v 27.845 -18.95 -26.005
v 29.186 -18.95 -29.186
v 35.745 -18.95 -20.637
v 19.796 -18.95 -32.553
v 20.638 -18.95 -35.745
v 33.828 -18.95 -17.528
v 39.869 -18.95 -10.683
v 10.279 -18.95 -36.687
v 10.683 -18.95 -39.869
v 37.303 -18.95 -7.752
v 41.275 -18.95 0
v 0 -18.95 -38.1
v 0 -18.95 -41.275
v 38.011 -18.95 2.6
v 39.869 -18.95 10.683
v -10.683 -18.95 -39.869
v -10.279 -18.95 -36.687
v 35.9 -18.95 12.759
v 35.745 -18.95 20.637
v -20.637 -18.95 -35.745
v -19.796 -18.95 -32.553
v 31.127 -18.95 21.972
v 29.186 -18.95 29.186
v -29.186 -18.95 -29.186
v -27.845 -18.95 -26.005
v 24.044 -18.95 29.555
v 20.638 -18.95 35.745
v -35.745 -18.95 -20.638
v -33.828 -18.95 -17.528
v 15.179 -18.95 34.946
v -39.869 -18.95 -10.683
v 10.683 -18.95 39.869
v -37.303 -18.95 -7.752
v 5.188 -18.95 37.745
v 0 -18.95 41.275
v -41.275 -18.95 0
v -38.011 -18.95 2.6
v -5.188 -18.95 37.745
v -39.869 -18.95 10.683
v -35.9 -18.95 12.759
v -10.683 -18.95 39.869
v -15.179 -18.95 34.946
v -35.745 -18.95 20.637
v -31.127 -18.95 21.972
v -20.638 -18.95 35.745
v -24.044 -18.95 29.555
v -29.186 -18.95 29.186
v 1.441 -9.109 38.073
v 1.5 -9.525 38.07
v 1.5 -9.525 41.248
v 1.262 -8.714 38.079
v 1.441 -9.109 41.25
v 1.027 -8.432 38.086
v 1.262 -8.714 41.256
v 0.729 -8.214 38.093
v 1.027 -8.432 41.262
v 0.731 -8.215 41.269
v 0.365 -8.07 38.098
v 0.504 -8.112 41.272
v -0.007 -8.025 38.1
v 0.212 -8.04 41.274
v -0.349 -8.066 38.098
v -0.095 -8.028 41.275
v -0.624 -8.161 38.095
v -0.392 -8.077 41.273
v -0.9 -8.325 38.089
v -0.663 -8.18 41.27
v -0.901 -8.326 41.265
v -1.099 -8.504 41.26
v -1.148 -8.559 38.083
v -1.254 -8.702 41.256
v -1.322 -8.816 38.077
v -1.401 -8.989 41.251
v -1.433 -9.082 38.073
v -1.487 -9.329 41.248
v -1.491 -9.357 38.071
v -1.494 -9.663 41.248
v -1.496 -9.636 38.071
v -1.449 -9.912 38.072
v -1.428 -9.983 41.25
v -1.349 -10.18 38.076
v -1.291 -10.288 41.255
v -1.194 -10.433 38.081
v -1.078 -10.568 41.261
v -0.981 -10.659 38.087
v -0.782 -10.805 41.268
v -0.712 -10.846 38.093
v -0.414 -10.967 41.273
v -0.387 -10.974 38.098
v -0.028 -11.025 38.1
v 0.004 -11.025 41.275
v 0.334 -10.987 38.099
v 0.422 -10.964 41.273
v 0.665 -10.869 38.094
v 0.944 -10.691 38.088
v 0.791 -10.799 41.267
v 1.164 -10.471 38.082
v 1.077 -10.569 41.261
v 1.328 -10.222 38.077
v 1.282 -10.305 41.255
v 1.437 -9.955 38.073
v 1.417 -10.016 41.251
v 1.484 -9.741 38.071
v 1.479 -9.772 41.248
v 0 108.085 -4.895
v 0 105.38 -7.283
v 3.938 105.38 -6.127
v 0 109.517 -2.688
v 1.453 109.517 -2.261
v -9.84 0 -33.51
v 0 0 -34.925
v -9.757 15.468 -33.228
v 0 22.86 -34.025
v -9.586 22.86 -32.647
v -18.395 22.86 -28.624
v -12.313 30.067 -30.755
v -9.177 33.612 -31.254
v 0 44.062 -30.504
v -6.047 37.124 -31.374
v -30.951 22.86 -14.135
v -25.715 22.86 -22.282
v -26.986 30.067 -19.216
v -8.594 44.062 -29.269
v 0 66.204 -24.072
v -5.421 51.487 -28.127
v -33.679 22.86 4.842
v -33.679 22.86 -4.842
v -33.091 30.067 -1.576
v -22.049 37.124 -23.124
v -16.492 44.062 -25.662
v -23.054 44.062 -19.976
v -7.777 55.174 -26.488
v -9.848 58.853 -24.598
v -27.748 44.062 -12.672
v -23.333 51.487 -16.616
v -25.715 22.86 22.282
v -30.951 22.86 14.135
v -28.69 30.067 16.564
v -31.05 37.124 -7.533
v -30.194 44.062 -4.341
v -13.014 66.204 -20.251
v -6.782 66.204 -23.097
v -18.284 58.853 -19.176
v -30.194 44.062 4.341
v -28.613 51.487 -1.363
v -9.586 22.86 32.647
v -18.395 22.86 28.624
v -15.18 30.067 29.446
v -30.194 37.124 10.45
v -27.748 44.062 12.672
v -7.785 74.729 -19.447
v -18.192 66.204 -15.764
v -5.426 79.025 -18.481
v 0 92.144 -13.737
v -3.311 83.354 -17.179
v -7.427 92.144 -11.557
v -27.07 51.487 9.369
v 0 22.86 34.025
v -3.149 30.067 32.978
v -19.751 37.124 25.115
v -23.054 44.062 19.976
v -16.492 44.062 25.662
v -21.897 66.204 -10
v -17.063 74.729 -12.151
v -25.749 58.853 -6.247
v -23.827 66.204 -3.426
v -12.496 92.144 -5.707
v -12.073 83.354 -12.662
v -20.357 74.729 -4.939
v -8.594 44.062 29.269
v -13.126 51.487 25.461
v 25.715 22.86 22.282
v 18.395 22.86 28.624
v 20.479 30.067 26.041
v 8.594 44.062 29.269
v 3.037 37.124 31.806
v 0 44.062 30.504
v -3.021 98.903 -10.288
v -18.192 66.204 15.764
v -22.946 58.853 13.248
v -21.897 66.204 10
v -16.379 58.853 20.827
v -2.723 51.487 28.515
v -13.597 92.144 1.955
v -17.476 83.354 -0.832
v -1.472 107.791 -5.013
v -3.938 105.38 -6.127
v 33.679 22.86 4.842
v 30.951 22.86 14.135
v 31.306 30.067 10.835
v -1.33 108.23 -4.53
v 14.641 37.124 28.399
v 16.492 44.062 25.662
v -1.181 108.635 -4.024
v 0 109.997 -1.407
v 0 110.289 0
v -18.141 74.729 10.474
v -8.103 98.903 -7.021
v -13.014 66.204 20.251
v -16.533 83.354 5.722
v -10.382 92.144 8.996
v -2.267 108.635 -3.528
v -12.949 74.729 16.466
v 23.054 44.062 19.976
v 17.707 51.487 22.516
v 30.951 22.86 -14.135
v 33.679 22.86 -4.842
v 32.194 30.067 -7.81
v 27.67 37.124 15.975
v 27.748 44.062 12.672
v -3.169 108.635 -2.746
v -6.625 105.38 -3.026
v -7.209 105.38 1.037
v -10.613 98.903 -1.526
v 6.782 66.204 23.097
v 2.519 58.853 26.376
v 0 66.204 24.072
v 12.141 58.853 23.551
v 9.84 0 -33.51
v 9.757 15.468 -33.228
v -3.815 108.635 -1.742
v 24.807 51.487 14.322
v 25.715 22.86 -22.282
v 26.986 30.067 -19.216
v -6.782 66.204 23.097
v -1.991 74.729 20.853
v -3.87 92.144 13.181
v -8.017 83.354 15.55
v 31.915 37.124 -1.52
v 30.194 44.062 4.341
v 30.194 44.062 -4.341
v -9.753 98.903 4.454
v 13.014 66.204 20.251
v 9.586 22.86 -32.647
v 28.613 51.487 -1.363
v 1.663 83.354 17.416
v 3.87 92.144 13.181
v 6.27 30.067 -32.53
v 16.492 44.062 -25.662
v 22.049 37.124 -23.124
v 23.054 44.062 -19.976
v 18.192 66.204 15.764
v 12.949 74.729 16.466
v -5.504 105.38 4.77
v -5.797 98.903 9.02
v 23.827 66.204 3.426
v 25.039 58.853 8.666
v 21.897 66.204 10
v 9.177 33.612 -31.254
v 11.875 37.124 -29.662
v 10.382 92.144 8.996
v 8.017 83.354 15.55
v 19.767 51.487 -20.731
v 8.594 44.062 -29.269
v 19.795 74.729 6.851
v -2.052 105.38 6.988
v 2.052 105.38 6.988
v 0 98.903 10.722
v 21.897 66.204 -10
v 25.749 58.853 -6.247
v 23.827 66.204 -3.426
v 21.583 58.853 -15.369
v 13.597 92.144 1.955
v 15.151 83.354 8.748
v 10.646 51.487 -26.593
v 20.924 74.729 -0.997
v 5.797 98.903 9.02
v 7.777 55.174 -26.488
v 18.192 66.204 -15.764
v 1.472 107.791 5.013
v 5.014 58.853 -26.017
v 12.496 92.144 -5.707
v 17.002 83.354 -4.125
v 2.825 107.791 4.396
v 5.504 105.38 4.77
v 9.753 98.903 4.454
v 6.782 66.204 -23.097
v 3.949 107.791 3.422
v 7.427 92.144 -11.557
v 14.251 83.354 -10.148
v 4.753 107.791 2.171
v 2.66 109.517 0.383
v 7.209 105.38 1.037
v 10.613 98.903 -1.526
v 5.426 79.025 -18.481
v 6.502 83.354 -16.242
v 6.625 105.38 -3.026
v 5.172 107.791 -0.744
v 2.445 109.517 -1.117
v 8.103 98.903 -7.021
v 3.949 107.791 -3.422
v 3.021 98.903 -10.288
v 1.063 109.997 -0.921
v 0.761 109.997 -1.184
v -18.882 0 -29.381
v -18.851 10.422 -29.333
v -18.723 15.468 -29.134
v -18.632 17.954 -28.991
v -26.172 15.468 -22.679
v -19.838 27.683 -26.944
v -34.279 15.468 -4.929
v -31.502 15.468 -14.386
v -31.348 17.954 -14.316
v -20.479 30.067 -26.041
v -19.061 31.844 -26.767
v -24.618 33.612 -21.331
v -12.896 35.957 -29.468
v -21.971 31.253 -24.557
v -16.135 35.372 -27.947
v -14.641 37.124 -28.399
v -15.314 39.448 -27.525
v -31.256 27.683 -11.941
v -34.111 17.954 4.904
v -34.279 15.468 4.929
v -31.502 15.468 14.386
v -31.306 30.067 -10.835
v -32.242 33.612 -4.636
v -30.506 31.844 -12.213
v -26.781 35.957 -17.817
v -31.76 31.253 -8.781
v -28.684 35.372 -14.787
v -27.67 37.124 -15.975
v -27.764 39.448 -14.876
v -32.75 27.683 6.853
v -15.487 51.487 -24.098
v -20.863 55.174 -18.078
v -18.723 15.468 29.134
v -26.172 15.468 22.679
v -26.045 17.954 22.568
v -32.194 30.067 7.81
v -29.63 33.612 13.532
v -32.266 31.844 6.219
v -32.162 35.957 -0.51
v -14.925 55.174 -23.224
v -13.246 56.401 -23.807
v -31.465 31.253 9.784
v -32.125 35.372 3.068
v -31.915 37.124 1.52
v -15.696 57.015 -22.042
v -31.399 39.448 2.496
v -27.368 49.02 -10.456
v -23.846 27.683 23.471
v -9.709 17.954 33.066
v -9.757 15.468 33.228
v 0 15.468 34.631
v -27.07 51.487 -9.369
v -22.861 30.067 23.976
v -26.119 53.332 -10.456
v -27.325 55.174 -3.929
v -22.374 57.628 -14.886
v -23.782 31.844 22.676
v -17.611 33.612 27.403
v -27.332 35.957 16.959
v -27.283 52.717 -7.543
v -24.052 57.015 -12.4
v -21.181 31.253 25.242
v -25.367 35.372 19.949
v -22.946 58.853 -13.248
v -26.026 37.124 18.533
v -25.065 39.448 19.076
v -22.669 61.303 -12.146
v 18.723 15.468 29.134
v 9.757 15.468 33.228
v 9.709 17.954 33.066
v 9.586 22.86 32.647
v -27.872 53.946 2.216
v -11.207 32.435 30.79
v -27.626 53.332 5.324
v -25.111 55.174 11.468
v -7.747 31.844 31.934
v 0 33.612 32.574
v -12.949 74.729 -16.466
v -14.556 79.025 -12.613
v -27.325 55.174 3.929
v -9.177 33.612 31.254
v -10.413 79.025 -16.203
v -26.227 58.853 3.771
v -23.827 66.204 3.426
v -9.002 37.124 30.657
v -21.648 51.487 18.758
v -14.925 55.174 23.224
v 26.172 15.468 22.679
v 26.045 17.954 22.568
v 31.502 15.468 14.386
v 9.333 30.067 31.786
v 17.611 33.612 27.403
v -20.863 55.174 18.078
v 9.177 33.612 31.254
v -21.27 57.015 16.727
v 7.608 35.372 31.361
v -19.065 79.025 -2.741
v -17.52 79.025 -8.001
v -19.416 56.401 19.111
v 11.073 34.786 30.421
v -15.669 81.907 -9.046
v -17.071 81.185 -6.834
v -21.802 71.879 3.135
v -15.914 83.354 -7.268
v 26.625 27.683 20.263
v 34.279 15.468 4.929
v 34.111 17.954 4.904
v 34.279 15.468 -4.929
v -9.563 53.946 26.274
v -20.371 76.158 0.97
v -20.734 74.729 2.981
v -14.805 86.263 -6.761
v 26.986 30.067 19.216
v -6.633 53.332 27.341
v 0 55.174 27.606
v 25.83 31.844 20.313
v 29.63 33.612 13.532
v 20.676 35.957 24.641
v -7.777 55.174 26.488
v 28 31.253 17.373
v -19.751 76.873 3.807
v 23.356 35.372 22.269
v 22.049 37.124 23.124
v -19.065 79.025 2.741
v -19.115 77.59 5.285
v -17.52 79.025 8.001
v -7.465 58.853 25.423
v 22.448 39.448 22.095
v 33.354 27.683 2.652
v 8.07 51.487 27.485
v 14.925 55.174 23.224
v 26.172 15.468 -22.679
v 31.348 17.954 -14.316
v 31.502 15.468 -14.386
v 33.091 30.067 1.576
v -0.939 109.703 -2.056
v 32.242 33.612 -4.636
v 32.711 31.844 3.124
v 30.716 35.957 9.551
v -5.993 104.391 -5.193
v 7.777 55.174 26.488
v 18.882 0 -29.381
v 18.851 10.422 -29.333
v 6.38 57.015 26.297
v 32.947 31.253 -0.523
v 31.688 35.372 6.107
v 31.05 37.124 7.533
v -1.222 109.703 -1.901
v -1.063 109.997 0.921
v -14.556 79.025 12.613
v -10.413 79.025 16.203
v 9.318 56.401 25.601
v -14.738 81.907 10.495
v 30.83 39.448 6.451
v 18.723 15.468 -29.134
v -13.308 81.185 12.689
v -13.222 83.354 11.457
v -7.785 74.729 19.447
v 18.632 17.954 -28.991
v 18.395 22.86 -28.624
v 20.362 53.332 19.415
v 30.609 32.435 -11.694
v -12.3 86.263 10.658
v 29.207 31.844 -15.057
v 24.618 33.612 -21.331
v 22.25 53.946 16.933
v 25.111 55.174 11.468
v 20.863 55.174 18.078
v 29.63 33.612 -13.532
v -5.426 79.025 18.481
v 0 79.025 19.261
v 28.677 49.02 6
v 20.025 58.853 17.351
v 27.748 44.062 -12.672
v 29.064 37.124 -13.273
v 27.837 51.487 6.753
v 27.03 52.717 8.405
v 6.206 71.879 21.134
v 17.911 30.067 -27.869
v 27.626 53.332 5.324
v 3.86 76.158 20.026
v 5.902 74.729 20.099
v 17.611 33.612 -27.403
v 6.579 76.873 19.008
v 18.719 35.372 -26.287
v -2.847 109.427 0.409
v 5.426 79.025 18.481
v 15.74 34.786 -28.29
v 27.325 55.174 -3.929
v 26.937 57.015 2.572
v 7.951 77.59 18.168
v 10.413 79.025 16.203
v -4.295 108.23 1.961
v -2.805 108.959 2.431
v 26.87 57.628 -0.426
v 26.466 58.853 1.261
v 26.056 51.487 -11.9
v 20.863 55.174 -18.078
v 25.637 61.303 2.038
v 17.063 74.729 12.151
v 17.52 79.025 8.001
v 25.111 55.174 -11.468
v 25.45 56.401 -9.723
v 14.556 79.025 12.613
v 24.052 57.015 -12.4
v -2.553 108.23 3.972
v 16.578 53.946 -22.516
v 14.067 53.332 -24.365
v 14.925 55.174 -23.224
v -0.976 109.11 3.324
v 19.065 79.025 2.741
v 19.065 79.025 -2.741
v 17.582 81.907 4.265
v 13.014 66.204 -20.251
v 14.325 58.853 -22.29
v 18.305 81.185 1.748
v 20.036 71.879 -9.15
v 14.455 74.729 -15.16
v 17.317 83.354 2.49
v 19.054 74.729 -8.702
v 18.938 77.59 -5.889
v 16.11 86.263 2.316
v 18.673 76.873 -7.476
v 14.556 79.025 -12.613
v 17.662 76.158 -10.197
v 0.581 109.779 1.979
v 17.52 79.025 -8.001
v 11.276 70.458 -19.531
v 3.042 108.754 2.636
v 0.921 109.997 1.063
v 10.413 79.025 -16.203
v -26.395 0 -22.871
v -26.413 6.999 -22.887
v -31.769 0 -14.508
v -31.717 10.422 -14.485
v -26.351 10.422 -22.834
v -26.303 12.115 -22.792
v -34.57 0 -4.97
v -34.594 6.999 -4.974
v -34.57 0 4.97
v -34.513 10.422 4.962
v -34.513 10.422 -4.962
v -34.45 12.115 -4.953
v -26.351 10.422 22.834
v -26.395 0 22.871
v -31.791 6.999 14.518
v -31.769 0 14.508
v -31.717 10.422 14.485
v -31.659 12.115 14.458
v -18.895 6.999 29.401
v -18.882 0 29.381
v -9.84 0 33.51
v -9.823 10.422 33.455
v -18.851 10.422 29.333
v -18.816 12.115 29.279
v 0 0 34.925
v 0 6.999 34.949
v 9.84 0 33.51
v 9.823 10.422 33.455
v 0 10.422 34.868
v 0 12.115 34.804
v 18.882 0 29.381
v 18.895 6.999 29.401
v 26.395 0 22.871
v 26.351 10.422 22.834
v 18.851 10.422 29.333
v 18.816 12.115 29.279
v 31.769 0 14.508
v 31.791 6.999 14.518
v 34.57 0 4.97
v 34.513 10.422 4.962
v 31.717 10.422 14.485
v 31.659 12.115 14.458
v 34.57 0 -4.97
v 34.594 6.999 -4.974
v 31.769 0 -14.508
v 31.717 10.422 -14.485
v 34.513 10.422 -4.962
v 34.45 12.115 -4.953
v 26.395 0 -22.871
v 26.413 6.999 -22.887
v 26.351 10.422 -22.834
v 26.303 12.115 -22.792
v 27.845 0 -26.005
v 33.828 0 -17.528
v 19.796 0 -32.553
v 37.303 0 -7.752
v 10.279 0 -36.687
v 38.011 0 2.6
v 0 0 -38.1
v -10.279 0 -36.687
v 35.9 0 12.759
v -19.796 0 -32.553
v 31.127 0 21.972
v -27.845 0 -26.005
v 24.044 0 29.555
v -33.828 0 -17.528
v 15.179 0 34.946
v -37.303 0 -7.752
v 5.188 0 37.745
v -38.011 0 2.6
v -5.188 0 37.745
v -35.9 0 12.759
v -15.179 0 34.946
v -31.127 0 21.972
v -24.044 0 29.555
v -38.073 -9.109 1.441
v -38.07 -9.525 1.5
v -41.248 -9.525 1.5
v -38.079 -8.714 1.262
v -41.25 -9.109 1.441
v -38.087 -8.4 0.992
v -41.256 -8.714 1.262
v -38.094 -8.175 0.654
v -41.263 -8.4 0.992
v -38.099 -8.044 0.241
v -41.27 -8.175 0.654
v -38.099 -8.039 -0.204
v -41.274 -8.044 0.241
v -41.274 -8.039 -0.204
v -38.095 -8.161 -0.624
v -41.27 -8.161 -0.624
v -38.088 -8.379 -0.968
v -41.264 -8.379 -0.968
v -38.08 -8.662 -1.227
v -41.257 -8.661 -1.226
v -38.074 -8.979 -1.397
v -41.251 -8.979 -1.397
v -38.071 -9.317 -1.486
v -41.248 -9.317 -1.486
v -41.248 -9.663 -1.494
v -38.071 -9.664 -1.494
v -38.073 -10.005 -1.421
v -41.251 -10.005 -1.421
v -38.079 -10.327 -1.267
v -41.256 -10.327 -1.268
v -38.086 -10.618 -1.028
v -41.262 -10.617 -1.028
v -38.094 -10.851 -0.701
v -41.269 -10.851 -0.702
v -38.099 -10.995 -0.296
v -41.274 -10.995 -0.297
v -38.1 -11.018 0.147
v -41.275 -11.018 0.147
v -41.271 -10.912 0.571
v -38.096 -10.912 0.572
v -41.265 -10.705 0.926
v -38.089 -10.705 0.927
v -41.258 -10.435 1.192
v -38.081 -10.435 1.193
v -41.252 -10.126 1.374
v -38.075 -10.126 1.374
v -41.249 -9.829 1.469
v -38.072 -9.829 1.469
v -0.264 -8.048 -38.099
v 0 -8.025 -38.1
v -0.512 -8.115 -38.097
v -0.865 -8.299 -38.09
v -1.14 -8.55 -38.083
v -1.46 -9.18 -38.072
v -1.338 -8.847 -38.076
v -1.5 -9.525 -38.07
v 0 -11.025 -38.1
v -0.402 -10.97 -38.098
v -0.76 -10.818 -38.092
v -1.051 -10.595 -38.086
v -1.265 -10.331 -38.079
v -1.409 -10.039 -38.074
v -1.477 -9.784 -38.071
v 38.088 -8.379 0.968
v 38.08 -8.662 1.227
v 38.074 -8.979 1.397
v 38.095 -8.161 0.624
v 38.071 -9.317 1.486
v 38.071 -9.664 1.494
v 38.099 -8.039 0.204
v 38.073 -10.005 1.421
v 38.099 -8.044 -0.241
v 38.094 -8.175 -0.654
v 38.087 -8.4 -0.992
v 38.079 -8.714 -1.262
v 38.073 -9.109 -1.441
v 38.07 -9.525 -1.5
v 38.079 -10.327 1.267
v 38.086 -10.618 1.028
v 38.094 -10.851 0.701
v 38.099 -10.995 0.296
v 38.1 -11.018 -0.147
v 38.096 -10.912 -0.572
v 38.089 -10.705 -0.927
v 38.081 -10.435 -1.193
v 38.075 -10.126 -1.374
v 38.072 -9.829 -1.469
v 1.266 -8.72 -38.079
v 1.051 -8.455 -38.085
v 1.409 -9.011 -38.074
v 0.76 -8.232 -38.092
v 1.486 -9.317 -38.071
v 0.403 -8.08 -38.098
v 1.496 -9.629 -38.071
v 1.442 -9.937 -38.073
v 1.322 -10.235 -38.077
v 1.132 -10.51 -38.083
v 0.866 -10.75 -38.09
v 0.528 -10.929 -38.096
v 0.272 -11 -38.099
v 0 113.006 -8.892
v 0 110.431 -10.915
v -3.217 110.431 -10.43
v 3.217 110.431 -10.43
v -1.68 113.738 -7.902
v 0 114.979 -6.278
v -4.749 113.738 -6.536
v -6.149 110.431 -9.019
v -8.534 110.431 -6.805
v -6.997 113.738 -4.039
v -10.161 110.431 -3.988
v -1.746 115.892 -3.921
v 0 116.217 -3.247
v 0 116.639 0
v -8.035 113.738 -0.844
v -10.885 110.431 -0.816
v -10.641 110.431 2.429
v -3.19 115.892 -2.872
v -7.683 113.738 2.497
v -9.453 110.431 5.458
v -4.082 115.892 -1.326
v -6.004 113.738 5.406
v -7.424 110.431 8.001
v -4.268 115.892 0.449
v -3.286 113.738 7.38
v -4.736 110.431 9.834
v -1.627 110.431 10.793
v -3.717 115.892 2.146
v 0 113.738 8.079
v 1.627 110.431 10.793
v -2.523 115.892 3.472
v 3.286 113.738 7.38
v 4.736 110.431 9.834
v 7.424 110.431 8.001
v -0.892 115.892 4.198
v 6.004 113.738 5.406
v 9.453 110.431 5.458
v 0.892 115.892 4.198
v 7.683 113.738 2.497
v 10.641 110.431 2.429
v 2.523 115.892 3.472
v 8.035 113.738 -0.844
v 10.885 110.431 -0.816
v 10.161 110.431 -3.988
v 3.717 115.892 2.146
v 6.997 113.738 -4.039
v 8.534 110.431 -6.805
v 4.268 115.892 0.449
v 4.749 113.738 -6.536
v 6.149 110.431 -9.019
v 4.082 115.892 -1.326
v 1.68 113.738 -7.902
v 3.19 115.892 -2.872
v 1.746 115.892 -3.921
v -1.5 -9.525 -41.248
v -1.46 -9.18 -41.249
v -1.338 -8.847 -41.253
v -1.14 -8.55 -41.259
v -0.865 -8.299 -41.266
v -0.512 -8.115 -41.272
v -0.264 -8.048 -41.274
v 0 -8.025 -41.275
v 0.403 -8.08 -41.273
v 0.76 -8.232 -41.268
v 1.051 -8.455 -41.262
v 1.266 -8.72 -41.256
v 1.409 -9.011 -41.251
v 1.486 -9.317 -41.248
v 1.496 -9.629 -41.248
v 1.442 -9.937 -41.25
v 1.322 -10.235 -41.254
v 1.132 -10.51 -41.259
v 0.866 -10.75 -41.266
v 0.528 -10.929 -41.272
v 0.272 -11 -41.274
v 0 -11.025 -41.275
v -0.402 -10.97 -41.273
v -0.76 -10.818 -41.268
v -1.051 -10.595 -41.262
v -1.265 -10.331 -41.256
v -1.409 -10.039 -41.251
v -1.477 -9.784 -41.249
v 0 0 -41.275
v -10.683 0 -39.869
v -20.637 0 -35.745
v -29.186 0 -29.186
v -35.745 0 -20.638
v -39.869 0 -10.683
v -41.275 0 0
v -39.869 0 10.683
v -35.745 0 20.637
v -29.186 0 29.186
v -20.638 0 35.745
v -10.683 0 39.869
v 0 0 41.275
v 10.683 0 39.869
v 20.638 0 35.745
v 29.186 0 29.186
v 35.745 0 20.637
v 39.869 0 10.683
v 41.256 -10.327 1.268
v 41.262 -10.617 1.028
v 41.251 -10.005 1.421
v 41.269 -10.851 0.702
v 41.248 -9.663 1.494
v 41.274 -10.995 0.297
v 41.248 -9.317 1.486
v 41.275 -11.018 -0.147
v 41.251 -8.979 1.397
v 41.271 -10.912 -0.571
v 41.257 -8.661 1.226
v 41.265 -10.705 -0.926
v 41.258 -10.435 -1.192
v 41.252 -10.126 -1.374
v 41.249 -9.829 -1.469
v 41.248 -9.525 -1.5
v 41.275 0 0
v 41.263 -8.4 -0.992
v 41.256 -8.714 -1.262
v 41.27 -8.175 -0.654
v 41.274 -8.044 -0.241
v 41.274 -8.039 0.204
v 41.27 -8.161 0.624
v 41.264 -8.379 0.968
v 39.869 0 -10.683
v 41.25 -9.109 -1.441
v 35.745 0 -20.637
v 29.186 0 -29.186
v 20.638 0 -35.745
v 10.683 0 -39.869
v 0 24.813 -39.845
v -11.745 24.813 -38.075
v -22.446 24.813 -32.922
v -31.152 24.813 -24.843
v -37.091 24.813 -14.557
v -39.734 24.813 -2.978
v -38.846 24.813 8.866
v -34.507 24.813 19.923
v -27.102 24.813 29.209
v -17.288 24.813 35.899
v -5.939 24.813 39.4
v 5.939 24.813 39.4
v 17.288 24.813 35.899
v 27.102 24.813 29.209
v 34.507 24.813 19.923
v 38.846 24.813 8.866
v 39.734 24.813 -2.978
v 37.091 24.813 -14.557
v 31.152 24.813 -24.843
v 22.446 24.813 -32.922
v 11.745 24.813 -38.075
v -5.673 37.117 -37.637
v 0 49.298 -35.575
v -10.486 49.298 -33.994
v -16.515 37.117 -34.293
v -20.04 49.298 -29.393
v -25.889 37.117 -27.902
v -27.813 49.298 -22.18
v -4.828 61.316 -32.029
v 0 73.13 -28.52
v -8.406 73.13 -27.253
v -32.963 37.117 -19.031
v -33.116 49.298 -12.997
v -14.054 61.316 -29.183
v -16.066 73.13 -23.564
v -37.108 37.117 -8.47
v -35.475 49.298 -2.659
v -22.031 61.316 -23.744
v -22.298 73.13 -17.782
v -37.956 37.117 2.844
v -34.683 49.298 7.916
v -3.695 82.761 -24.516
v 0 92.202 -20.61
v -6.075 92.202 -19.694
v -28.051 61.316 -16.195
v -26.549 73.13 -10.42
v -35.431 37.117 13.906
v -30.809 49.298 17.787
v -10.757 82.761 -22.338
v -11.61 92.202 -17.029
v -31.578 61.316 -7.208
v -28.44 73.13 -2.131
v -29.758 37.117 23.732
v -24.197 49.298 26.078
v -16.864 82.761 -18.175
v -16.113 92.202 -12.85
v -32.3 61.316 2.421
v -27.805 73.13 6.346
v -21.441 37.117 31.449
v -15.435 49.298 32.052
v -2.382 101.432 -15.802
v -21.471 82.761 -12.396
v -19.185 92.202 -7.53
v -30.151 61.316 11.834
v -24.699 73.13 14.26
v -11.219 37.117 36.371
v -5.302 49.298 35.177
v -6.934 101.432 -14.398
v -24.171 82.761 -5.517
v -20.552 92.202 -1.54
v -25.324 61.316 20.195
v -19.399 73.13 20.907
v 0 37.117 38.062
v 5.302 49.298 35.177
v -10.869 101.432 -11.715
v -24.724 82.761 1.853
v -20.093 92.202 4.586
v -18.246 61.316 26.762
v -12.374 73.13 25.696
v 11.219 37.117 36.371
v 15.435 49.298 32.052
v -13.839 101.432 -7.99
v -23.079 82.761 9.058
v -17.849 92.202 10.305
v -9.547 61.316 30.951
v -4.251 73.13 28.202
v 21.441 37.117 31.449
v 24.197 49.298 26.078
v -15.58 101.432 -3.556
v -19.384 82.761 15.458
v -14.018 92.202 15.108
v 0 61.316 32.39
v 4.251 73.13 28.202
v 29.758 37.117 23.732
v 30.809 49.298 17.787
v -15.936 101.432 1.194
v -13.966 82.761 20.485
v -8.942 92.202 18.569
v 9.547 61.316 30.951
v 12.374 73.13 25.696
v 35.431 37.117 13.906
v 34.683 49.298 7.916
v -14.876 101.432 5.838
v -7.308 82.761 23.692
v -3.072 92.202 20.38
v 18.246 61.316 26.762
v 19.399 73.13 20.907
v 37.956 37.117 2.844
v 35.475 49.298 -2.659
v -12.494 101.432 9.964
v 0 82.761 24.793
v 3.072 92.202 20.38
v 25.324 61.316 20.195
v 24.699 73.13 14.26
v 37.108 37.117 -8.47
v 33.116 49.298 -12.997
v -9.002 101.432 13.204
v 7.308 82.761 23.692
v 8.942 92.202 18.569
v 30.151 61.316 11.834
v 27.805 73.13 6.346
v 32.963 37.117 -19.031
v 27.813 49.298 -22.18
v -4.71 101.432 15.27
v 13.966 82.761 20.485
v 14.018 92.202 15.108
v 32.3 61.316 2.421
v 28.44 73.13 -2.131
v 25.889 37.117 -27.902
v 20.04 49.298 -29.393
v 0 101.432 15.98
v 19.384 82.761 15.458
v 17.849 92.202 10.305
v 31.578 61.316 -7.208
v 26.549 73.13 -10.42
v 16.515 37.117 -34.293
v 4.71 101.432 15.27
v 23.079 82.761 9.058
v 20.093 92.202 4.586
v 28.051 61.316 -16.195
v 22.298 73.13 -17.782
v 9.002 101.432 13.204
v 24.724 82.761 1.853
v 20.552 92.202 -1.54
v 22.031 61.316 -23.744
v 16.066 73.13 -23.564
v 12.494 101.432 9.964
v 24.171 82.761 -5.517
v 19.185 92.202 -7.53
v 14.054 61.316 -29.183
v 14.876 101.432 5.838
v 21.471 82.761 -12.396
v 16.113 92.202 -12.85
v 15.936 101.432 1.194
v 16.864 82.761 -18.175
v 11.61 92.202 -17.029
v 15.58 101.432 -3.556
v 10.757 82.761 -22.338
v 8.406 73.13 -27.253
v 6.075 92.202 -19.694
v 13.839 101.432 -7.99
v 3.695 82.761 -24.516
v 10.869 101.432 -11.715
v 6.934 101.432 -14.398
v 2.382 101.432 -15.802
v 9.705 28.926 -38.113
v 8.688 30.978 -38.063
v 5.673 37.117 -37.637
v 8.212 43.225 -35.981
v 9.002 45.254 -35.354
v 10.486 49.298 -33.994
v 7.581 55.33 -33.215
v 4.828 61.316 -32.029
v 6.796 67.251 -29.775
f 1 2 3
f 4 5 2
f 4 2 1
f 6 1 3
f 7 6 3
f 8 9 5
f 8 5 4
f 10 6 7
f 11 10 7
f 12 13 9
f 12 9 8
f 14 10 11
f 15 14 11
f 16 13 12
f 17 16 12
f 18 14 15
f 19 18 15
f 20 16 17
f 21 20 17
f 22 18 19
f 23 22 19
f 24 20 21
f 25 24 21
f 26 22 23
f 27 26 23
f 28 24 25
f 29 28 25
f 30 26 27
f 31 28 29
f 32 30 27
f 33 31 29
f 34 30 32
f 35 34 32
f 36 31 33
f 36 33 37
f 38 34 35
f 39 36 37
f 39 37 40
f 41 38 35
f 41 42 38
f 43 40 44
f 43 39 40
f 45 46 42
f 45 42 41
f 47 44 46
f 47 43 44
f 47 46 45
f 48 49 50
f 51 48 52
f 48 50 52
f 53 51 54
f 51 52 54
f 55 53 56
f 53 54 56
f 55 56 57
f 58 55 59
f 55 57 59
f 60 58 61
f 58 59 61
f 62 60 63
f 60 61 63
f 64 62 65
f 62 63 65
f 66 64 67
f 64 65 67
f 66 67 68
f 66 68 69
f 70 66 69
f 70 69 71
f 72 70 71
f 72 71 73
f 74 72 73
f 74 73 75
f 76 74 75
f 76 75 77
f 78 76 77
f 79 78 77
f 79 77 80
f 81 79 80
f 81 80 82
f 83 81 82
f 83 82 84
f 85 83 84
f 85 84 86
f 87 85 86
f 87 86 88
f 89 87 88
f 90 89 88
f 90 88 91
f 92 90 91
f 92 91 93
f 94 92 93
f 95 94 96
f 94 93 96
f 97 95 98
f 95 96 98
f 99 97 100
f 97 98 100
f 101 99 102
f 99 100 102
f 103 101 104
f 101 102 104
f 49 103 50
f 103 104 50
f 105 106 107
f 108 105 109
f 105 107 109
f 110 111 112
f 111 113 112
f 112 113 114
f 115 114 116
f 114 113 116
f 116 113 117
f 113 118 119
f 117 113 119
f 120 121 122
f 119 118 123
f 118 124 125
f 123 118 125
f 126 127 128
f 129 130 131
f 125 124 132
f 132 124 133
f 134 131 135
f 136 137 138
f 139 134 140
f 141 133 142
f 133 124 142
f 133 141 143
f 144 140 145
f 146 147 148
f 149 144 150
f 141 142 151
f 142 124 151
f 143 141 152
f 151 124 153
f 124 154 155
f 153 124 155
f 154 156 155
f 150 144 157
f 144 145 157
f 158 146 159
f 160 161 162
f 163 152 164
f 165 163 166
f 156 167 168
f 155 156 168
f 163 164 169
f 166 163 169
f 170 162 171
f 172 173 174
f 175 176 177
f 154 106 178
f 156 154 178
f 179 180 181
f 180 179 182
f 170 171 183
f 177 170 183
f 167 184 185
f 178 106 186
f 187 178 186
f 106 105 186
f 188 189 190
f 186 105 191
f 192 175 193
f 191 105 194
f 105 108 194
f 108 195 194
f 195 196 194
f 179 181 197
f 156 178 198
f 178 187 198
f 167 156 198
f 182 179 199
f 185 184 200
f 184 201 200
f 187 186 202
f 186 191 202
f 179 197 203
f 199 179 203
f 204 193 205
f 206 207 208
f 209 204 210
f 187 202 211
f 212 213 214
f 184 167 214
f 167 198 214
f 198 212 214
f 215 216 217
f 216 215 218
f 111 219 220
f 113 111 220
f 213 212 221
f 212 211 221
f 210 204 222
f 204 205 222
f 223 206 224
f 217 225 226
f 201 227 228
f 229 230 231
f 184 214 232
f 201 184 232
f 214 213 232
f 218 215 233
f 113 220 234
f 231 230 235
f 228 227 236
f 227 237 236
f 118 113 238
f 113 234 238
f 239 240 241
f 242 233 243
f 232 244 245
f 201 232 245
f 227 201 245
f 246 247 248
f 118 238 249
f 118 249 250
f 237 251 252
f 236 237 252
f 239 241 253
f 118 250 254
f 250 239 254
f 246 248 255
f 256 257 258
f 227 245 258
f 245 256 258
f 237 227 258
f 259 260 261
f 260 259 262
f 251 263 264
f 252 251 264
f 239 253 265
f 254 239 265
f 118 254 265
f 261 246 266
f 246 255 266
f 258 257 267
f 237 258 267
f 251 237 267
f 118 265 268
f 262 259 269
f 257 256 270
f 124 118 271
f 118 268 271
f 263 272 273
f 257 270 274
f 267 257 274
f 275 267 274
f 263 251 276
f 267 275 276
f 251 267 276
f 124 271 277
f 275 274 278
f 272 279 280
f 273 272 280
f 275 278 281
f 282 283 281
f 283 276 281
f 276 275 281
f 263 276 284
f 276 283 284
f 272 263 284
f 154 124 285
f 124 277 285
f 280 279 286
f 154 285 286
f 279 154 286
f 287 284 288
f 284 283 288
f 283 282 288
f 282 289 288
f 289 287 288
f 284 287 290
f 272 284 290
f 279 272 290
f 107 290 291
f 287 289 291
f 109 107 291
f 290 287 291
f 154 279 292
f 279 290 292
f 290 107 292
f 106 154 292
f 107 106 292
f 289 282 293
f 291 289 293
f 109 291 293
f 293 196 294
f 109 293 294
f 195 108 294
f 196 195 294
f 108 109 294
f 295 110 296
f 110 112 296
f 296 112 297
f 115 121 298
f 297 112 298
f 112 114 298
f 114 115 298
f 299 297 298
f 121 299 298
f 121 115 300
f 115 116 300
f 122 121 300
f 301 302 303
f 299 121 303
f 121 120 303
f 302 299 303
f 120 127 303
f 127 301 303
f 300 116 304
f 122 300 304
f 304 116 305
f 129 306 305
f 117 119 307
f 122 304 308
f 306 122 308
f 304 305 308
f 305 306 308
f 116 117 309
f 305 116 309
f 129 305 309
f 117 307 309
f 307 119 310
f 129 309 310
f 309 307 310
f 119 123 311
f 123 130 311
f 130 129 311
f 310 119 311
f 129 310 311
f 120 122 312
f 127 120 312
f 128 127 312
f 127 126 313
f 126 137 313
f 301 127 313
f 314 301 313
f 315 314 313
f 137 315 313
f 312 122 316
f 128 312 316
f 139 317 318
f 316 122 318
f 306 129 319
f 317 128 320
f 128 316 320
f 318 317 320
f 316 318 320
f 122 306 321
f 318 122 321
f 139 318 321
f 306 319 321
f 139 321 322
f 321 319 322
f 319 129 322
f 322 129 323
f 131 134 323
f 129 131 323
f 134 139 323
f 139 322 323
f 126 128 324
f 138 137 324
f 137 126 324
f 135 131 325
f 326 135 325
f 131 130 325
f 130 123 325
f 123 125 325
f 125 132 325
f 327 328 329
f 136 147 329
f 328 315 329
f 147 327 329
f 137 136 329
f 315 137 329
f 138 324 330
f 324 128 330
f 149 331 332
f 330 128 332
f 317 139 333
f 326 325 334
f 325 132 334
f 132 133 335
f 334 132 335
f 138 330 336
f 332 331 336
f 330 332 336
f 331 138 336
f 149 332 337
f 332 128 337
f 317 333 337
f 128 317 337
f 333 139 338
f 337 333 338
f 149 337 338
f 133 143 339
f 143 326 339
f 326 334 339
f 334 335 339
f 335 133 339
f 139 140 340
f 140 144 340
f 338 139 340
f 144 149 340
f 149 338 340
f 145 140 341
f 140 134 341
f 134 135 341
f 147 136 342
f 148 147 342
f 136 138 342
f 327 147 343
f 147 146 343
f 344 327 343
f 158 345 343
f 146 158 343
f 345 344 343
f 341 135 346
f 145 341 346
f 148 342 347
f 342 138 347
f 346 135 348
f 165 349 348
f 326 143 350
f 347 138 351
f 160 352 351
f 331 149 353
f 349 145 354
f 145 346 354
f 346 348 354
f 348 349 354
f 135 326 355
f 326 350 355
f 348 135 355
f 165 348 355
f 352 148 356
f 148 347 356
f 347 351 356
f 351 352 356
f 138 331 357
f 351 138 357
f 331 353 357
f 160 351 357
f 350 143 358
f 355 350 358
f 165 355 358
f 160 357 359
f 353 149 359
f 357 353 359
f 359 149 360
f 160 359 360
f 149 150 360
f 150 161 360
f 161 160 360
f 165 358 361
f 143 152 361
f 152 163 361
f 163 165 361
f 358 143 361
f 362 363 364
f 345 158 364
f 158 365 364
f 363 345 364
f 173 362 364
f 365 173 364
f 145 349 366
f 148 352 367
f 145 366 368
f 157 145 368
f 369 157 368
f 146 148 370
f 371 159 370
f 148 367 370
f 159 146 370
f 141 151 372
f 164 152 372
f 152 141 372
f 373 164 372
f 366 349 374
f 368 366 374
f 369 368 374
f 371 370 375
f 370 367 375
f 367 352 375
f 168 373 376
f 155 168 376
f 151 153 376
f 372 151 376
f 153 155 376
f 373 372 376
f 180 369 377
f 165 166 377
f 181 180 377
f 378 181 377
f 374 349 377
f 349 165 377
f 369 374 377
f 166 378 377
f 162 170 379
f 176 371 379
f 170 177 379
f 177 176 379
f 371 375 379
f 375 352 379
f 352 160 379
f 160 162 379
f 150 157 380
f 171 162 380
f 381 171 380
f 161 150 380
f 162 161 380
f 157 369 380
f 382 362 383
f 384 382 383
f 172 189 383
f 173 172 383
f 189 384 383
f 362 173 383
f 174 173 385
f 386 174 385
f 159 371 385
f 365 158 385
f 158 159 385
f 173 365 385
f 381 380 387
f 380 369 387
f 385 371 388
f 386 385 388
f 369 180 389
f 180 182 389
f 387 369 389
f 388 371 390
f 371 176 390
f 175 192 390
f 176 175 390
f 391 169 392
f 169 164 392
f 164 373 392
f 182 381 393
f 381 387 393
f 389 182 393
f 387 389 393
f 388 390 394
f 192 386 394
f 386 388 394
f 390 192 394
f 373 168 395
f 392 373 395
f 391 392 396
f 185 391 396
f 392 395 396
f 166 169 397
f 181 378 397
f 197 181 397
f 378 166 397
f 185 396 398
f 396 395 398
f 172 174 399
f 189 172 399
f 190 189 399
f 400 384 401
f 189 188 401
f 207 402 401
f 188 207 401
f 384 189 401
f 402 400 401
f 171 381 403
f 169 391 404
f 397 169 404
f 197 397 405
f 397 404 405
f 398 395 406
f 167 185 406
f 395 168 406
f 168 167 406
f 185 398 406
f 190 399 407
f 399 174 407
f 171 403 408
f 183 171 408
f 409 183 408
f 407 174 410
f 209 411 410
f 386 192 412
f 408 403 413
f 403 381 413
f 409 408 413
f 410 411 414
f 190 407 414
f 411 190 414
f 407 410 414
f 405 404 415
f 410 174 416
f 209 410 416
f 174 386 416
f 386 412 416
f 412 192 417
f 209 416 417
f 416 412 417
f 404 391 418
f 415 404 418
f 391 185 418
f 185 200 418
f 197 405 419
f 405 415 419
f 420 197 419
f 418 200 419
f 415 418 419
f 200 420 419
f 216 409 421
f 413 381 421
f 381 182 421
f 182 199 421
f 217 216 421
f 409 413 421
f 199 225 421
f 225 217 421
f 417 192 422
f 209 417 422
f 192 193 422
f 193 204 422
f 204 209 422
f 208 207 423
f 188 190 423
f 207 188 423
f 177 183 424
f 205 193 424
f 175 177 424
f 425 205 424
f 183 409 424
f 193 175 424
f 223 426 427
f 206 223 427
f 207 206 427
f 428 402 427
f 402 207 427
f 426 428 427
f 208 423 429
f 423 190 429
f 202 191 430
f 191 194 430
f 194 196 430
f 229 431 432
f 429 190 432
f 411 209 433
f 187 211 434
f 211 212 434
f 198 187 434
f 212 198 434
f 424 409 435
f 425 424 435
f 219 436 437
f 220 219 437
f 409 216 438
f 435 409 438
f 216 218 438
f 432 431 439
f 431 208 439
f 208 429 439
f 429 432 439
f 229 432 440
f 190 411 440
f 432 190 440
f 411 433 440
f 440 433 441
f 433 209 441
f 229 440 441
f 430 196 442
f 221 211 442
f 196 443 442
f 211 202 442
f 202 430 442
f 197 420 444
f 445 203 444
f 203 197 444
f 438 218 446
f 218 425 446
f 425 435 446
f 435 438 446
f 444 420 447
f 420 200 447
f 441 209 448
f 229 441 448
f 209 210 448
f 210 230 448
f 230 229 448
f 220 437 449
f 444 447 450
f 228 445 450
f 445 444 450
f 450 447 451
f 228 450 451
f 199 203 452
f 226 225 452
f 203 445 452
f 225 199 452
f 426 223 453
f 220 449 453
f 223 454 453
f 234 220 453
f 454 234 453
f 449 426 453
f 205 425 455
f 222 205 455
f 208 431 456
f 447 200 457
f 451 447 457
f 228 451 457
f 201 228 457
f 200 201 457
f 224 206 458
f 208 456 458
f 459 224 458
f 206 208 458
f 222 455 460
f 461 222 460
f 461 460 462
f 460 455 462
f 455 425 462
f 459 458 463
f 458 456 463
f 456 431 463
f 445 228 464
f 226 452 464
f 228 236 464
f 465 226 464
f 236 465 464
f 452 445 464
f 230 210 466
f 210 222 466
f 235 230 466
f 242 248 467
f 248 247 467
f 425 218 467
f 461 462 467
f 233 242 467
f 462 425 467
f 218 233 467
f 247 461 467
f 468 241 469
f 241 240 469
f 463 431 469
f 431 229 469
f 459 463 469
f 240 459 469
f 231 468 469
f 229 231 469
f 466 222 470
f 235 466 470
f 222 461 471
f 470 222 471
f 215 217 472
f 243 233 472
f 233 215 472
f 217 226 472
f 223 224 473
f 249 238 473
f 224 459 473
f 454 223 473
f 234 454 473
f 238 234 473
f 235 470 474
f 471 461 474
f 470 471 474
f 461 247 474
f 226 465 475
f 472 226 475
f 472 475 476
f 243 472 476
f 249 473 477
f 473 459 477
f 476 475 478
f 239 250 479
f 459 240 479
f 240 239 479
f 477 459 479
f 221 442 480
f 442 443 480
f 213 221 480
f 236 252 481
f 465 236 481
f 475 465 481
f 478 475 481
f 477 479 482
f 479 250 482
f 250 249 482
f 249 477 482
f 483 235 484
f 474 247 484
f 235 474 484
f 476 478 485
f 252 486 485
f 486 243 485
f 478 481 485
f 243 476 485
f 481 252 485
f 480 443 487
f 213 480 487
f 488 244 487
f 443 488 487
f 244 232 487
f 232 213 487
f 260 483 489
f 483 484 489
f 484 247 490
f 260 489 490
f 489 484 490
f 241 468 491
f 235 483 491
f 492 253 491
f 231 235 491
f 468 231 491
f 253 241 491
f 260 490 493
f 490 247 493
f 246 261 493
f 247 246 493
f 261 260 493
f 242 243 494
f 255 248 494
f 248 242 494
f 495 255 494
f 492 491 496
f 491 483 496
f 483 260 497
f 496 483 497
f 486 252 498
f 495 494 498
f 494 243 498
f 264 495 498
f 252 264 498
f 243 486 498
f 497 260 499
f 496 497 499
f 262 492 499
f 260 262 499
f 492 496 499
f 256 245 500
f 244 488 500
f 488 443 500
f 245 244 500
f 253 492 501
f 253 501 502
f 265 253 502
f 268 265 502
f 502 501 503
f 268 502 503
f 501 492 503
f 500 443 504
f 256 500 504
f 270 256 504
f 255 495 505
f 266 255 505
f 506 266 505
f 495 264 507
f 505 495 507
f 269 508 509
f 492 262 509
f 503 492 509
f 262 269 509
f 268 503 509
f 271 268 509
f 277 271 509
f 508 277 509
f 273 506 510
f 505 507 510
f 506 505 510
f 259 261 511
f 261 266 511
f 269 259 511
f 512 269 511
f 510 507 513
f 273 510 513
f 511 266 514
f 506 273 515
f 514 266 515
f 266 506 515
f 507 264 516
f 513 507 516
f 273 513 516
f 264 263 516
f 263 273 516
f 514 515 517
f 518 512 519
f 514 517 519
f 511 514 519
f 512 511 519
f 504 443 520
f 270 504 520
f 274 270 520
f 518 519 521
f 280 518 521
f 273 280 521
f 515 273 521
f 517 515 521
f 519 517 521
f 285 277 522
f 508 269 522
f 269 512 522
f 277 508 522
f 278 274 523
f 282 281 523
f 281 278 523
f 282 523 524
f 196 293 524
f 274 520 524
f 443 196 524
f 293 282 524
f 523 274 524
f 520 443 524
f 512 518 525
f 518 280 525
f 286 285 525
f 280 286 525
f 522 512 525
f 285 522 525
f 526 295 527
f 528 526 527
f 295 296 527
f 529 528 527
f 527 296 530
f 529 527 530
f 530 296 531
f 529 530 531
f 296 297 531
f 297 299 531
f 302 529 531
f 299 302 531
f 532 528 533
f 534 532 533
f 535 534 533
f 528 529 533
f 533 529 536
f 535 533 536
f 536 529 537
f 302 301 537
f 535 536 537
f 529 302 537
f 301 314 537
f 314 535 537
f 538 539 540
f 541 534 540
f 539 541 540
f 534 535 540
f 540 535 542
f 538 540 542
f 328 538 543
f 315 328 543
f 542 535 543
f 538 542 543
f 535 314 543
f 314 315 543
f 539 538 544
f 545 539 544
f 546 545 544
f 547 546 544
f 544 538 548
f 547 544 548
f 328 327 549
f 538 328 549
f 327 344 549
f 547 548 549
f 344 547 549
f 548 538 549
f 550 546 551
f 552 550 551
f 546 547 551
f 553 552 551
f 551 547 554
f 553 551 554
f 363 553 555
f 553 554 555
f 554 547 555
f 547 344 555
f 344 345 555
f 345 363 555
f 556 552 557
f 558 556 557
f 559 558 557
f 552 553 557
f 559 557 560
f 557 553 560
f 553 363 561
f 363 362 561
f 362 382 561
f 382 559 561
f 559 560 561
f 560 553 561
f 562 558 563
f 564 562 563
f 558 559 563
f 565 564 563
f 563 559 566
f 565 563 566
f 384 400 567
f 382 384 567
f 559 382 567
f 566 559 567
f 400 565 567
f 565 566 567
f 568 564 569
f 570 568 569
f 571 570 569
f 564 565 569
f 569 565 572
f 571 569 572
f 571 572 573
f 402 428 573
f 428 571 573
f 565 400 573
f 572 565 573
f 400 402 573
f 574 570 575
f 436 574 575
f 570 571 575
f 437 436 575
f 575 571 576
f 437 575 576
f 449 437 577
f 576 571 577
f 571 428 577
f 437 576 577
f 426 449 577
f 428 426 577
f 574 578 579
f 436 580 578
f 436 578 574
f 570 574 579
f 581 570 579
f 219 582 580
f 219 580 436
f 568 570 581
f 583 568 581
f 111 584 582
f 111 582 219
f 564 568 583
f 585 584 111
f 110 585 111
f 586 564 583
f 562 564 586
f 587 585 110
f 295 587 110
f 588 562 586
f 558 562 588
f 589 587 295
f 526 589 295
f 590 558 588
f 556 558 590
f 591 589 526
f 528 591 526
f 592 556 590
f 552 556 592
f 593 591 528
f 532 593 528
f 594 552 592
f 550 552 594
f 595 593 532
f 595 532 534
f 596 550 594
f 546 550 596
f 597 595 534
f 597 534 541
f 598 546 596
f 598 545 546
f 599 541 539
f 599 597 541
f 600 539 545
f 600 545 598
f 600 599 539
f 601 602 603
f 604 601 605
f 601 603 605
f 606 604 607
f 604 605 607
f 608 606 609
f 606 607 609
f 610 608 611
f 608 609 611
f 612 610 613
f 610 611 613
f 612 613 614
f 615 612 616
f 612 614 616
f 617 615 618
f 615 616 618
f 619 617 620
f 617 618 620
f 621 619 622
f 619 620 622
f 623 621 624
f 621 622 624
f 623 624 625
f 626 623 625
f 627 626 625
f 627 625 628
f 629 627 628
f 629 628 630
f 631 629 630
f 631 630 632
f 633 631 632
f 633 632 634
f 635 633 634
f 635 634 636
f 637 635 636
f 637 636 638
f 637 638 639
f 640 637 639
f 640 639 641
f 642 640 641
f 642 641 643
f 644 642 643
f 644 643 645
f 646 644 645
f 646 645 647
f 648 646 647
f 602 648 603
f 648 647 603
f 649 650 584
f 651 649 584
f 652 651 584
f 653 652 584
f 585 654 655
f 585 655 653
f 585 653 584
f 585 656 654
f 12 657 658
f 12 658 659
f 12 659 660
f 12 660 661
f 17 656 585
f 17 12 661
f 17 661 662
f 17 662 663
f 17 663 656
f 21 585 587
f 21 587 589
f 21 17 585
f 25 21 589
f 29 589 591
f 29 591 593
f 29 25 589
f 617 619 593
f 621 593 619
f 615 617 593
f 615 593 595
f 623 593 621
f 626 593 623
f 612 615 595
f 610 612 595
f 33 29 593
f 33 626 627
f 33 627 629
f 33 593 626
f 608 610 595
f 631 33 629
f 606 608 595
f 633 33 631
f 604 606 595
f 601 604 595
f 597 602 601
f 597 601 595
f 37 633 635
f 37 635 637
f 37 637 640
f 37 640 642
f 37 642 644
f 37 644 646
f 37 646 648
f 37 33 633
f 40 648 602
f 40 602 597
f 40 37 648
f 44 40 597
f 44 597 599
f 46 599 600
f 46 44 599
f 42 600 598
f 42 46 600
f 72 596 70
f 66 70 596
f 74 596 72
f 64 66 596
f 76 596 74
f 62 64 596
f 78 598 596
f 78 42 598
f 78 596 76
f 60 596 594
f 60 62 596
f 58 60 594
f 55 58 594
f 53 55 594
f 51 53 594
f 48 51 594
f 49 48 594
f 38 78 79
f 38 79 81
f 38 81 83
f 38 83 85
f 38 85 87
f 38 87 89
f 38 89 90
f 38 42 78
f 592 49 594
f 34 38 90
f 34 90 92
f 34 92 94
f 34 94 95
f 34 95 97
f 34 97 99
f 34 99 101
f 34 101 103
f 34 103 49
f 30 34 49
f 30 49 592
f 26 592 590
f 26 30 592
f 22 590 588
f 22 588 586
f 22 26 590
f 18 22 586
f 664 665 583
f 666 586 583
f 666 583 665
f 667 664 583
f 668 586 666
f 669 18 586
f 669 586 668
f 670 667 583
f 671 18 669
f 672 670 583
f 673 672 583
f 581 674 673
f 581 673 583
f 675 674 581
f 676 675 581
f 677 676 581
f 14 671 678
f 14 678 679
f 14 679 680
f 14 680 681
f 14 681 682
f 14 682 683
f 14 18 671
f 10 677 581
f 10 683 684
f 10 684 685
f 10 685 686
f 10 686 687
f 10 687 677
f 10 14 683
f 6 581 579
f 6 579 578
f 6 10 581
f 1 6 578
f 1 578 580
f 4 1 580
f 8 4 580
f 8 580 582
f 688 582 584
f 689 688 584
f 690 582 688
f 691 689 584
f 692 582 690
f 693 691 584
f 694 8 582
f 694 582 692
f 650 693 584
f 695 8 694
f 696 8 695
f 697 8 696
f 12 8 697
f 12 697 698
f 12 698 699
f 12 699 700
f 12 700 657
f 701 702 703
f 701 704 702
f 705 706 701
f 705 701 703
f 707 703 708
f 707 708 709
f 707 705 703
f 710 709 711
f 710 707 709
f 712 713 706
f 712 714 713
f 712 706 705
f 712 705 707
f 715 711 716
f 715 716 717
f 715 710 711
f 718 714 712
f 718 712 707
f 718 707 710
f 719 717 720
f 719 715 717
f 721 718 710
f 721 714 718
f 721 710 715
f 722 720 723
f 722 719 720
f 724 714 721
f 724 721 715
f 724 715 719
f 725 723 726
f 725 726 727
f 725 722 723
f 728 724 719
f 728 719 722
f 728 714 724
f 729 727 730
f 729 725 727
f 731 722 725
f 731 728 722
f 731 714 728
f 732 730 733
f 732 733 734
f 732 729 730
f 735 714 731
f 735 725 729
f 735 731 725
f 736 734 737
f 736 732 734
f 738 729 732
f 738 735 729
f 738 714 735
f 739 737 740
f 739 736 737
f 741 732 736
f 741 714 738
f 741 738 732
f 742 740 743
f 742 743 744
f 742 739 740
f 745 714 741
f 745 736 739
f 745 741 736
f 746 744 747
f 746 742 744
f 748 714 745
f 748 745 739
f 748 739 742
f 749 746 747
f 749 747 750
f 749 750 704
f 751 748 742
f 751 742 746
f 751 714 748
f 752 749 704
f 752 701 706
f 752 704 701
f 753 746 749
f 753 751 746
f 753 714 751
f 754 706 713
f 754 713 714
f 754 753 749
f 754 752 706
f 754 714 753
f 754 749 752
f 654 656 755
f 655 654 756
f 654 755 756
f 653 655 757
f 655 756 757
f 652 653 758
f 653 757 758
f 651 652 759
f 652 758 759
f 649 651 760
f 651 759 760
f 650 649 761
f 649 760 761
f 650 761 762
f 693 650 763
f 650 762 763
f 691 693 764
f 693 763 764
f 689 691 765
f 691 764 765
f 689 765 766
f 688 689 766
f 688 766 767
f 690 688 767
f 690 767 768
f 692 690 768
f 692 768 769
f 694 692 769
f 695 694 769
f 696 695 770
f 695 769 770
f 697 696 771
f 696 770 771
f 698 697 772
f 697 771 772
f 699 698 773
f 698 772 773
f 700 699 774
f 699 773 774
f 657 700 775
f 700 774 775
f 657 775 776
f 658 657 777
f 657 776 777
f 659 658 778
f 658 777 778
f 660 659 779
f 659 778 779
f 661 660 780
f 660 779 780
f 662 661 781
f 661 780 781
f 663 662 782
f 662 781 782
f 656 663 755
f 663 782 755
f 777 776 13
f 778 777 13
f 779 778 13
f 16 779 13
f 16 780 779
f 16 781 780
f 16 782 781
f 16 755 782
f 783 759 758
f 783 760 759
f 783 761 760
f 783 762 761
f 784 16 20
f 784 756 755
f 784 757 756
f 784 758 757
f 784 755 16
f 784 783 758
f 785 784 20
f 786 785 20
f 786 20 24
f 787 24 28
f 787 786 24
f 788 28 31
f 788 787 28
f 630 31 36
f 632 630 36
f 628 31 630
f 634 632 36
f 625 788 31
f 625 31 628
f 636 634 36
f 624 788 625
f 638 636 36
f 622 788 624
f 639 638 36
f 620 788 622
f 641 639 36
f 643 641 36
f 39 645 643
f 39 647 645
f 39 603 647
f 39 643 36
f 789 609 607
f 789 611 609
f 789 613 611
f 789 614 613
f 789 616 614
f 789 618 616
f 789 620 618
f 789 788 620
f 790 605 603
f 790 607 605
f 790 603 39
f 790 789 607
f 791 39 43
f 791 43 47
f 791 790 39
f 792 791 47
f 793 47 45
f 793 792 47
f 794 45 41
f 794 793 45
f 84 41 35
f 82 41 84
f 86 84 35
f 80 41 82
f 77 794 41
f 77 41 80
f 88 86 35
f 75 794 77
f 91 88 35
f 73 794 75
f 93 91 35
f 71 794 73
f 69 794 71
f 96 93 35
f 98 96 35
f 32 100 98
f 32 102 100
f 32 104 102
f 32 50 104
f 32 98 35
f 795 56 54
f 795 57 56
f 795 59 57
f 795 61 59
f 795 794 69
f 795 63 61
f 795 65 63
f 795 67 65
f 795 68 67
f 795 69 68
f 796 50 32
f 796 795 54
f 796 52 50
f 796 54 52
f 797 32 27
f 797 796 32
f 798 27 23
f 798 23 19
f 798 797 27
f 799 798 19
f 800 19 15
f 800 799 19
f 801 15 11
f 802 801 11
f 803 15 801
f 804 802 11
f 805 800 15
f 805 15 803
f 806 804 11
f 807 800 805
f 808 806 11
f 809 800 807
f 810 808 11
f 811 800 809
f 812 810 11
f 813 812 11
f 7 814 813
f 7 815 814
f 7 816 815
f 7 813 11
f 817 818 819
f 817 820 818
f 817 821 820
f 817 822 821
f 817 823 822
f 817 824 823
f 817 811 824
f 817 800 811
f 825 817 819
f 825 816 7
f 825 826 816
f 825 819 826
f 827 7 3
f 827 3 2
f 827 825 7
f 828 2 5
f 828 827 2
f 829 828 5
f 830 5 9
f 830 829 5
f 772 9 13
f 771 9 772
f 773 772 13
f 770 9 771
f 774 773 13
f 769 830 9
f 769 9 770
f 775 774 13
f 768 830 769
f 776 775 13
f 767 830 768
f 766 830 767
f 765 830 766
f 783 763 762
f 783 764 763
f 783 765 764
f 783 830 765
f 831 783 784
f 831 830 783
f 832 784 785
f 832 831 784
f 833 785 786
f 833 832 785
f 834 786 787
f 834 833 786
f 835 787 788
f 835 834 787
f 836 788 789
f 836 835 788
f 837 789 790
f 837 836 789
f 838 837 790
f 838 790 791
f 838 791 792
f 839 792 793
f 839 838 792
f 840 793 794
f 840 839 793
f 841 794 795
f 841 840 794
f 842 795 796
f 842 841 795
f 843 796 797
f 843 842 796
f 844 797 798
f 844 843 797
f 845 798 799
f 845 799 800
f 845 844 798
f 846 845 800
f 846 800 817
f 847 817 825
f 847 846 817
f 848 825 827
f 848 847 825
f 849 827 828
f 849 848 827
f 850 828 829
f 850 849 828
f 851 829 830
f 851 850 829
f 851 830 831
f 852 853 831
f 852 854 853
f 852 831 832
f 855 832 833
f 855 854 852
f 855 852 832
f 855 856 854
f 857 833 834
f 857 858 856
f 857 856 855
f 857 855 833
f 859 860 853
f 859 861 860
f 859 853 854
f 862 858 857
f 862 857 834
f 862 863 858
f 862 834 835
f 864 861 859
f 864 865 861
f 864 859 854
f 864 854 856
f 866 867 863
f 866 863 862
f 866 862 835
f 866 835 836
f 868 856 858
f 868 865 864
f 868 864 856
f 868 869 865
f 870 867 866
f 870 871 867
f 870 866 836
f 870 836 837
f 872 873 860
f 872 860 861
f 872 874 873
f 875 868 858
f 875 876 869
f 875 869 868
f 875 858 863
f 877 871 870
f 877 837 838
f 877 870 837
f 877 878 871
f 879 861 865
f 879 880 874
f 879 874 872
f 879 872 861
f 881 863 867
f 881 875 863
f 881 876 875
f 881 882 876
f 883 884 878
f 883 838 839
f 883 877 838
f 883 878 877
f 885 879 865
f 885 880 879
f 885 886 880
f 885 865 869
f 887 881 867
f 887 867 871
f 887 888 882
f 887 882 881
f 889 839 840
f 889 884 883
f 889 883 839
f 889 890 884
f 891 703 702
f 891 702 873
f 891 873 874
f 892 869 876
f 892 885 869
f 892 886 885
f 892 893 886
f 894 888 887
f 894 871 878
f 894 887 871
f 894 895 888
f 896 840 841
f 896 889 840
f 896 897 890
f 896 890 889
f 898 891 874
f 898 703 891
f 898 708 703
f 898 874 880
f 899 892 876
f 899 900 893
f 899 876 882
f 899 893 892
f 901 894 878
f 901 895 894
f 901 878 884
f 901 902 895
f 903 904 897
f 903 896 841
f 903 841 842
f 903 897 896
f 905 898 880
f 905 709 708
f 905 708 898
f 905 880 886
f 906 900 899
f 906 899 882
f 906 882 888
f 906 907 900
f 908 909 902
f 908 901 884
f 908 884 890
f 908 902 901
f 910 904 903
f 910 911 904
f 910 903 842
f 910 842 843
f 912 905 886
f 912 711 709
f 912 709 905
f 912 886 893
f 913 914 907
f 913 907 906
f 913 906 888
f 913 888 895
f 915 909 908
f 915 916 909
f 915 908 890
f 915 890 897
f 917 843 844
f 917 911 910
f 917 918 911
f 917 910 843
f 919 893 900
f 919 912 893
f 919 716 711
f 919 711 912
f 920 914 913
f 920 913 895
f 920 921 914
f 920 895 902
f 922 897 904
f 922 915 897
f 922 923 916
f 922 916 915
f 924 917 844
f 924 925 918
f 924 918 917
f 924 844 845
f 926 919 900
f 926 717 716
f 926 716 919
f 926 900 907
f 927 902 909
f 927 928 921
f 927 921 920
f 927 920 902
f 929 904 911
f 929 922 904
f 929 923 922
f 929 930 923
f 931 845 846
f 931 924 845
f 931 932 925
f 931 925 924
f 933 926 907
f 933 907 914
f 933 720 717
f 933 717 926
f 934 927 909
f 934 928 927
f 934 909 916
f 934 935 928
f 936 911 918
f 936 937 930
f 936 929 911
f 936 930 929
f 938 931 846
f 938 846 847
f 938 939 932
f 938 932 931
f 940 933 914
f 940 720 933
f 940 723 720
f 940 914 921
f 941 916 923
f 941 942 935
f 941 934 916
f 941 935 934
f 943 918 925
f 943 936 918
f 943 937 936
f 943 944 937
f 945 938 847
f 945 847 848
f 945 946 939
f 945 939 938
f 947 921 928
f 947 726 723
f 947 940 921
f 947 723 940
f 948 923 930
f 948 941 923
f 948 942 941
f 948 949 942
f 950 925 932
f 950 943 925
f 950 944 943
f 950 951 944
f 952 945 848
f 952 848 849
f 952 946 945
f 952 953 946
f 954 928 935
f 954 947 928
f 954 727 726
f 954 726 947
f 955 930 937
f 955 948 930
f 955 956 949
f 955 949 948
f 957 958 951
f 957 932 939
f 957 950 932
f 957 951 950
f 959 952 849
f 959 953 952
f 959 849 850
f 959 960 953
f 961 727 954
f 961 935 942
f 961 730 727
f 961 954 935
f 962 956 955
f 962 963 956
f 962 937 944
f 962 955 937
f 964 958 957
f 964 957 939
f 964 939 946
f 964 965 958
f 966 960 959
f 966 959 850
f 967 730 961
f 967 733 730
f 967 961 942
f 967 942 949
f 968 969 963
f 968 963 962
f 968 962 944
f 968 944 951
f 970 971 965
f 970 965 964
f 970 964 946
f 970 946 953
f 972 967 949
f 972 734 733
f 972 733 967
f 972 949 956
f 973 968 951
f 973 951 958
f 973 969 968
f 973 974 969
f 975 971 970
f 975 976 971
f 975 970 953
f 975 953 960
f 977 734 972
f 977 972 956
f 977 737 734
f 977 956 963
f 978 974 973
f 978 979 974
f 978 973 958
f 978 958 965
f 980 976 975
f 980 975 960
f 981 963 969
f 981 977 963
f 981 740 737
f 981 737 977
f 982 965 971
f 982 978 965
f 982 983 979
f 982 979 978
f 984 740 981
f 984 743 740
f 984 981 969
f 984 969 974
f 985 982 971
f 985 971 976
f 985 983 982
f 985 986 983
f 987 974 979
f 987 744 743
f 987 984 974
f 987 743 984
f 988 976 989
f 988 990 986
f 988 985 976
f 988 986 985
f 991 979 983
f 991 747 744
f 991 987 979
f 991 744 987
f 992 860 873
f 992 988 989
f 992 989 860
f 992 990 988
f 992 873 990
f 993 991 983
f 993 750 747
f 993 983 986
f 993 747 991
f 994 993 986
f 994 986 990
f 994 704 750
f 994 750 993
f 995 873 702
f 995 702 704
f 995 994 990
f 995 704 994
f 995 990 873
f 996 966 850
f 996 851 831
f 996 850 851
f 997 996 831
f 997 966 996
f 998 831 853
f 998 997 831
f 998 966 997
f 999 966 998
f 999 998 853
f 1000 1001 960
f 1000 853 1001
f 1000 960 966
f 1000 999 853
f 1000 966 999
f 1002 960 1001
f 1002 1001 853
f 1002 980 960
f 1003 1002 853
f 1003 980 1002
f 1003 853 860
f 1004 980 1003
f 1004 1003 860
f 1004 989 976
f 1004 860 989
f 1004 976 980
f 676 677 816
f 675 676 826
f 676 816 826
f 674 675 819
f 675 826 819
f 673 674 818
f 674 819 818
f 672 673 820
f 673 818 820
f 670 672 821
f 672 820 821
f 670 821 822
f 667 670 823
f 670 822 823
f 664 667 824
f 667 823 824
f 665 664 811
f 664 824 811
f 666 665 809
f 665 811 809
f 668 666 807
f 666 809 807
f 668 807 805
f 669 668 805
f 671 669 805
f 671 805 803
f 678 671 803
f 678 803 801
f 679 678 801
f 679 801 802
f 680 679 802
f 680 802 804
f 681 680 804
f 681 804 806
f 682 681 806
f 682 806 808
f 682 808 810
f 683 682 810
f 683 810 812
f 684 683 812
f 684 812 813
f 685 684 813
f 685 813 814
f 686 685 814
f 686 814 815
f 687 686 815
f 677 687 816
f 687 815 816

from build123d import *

# Parameters (mm, degrees)
SKETCH7_R          = 1.5
CUT_EXTRUDE1_DEPTH = 3.81
CIRPATTERN1_COUNT  = 4


with BuildPart() as part:
    # Sketch1 → Revolve1 (revolve)
    with BuildSketch(Plane.XY, mode=Mode.PRIVATE) as revolve1_sk:
        with BuildLine():
            Line((0, 116.639076478), (0, 110.289076478))
            add(Edge.make_bspline(
                [(-34.925, 0), (-35.711738611, 37.014385541), (-24.511570594, 69.455143498), (-5.844600922, 109.524219753), (0, 110.289076478)],
                knots=[0, 0, 0, 0, 0.860279712, 1, 1, 1, 1], degree=3))
            Line((-34.925, 0), (-38.1, 0))
            Line((-38.1, 0), (-38.1, -18.95))
            Line((-38.1, -18.95), (-41.275, -18.95))
            Line((-41.275, -18.95), (-41.275, 0))
            add(Edge.make_bspline(
                [(-41.275, 0), (-41.275, 0.330502854), (-41.273557103, 0.805649639), (-41.268747446, 1.912092247), (-41.257925909, 2.719246857), (-41.246383117, 3.563883335), (-41.228347866, 4.535820012), (-41.200734551, 5.734179725), (-41.159757311, 7.129726347), (-41.100846347, 8.735373987), (-41.029571588, 10.346697141), (-40.946255064, 11.958844584), (-40.850901423, 13.569512918), (-40.743515987, 15.179892998), (-40.624104745, 16.789166096), (-40.459816828, 18.799743968), (-40.238647793, 21.210299788), (-39.945617875, 24.019277994), (-39.562802148, 27.224148418), (-38.809156369, 32.822061303), (-36.96766496, 43.970323281), (-33.49128341, 58.923697069), (-28.30812049, 74.663796505), (-22.487129194, 88.42095936), (-18.428836954, 96.767582764), (-16.193226279, 101.062272388), (-14.657371604, 103.891195217), (-13.781700582, 105.466687496), (-13.19565908, 106.505983946), (-12.707159013, 107.362552916), (-12.311115433, 108.050979413), (-11.92041177, 108.724783551), (-11.526473808, 109.398380474), (-11.168679866, 110.0041541), (-10.999621727, 110.28932335), (-10.915144579, 110.431350258)],
                knots=[0.08301761, 0.08301761, 0.08301761, 0.08301761, 0.08301761, 0.094422695, 0.100125237, 0.105827779, 0.111530322, 0.117232864, 0.128637949, 0.140293389, 0.15194883, 0.163604271, 0.175259711, 0.186915153, 0.198570596, 0.210226038, 0.22188148, 0.245192344, 0.268503208, 0.291814091, 0.315124974, 0.408368487, 0.594855494, 0.734720752, 0.792997941, 0.839619695, 0.862930572, 0.87458601, 0.885991093, 0.891693634, 0.897396175, 0.903098717, 0.908801258, 0.914503799, 0.920206341, 0.920206341, 0.920206341, 0.920206341, 0.920206341], degree=4))
            ThreePointArc((-10.915144579, 110.431350258), (-6.278460122, 114.97859361), (0, 116.639076478))
        make_face()
    revolve(revolve1_sk.sketch.rotate(Axis((0, 0, 0), (0, 1, 0)), 270), axis=Axis((0, 0, 0), (0, 1, 0)))

    # Sketch7 → Cut-Extrude1 (cut)
    with BuildSketch(Plane.XY.offset(41.275)):
        with Locations((0, -9.525)):
            Circle(SKETCH7_R)
    cut_extrude1 = extrude(amount=-CUT_EXTRUDE1_DEPTH, mode=Mode.SUBTRACT)

    # CirPattern1: Cut-Extrude1 ×4 about axis
    cirpattern1_axis = Axis((0, 0, 0), (0, -1, 0))
    for i in range(1, CIRPATTERN1_COUNT):
        add(cut_extrude1.rotate(cirpattern1_axis, i * 360 / CIRPATTERN1_COUNT), mode=Mode.SUBTRACT)


solid = part.part
